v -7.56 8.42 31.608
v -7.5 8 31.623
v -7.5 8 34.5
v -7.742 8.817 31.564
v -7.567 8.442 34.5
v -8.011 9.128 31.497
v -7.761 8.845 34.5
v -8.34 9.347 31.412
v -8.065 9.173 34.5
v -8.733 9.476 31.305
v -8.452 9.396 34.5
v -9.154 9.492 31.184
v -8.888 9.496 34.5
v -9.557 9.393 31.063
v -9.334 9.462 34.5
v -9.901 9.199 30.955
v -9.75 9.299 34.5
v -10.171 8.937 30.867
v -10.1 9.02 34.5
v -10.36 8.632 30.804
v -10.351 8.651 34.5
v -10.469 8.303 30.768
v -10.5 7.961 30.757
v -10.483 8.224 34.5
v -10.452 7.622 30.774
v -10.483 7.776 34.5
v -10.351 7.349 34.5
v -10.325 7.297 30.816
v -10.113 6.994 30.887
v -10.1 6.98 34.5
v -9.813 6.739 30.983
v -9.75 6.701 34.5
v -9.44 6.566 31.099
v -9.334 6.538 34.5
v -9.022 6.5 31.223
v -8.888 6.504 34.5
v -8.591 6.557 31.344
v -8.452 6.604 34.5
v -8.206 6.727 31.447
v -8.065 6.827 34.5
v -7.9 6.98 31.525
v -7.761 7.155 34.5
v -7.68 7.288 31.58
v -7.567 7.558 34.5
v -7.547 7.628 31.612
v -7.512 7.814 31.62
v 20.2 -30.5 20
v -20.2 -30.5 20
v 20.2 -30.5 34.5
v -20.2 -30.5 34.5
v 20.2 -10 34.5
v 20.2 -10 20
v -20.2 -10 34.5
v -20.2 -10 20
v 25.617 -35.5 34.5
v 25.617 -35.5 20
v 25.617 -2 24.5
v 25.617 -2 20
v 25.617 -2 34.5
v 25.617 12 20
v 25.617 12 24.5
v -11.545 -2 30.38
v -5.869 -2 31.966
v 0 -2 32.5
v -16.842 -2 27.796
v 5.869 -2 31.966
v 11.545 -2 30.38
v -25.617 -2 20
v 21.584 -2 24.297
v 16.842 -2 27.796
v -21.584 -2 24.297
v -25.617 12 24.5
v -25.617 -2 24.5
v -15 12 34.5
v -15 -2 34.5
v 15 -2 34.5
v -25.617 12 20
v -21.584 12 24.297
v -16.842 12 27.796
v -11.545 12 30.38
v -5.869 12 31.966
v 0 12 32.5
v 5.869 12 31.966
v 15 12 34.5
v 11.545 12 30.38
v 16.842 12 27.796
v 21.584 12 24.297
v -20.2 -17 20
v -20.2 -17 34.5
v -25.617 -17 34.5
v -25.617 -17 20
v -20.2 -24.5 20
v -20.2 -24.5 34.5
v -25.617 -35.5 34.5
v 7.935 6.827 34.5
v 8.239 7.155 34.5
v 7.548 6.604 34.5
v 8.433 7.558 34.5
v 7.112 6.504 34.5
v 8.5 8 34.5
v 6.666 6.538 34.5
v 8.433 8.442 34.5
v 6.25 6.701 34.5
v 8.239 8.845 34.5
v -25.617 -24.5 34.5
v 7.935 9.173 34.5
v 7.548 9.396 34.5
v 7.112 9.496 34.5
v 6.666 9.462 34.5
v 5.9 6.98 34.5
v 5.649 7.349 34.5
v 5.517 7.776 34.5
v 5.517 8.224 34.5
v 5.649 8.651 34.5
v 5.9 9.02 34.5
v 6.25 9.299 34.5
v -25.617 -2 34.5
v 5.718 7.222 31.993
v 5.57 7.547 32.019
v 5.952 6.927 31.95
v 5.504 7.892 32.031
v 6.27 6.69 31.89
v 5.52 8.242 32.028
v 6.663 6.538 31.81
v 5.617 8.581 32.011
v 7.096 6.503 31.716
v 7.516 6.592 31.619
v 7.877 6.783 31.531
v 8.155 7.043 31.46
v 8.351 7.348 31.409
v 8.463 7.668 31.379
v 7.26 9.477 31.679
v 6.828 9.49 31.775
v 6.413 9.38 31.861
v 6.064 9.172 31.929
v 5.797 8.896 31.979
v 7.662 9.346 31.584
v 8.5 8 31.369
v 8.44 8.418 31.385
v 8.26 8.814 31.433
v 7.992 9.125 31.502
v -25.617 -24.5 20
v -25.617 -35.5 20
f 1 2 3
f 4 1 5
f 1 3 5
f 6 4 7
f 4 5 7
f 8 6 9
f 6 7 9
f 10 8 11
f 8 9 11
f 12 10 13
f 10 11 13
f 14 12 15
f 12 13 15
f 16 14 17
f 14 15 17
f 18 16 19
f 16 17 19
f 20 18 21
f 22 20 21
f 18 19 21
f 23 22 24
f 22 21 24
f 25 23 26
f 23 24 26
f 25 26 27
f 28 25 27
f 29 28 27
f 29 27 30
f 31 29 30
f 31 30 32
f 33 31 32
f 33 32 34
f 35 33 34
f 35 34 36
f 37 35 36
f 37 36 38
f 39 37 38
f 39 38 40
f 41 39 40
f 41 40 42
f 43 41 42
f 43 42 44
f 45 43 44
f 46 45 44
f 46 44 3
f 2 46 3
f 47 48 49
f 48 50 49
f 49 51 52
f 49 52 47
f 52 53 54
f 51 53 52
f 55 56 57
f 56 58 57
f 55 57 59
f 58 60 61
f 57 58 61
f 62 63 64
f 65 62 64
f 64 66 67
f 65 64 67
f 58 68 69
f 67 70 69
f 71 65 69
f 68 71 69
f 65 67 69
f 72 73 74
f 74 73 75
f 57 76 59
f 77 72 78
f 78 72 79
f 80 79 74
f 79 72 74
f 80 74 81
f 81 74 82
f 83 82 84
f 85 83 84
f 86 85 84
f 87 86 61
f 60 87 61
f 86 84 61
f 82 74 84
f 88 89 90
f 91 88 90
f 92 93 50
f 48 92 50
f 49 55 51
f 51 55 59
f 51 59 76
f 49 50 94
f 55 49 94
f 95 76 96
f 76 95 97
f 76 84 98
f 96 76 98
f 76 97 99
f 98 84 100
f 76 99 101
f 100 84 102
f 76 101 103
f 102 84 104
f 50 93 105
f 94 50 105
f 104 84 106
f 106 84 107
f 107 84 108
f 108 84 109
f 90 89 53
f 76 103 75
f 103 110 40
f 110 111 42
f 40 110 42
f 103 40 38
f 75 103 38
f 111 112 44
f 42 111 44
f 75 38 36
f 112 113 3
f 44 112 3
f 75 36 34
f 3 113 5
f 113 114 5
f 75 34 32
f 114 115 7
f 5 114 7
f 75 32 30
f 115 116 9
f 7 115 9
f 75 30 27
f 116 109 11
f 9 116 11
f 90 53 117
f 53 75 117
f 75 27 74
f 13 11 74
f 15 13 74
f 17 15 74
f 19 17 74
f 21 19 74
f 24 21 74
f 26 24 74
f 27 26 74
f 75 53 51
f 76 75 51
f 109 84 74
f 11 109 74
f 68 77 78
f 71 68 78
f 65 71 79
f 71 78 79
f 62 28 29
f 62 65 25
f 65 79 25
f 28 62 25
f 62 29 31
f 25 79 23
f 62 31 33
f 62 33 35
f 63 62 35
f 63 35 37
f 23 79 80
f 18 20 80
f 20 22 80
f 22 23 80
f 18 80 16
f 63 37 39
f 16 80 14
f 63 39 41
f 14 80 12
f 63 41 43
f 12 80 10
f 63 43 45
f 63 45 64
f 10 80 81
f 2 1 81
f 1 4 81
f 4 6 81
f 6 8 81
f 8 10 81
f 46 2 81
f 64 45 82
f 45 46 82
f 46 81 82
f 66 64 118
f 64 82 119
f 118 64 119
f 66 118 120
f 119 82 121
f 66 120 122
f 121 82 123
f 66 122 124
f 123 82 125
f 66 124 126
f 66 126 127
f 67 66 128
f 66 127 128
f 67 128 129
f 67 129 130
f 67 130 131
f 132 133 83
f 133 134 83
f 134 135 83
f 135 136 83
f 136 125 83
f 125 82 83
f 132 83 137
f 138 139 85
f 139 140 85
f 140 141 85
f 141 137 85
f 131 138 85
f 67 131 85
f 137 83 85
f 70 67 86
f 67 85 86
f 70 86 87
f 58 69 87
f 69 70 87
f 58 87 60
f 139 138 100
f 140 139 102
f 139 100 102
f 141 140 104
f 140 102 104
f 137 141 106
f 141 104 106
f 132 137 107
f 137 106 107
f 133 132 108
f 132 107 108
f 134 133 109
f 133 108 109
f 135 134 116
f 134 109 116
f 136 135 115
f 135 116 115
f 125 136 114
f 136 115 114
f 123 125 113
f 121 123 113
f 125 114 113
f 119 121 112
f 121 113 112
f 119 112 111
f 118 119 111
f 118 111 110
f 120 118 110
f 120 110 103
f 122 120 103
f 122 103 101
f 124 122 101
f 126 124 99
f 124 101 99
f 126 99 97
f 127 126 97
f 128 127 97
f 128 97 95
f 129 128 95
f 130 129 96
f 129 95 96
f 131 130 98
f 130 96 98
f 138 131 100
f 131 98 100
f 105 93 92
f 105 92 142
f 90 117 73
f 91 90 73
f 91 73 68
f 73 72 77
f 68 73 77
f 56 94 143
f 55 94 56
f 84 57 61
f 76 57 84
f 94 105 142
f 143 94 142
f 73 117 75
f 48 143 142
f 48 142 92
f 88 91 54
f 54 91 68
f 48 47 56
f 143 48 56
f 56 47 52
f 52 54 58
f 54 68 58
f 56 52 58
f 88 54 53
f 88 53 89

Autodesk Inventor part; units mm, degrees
ref_plane "YZ Plane" through (0, 0, 0) normal (1, 0, 0) x (0, 1, 0)
ref_plane "XZ Plane" through (0, 0, 0) normal (0, 1, 0) x (-1, 0, 0)
ref_plane "XY Plane" through (0, 0, 0) normal (0, 0, 1) x (1, 0, 0)
ref_plane "Plano de trabajo1" through (16, 0, 22.5) normal (0, 0, -1) x (-1, 0, 0)
sketch "Boceto2" plane through (16, 0, 22.5) normal (0, 0, -1) x (-1, 0, 0)
  line L0 (-6.5, 0) -> (0, 0) projected
  line L1 (0, 0) -> (32, 0) projected
  circle A0 centre (8, 8) radius 1.5
  circle A1 centre (24, 8) radius 1.5
  point P0 (16, 0)
  dimension "d15" = 3
  dimension "d16" = 3
extrude "Extrusión2" [suppressed]
ref_plane "Plano de trabajo2" through (0, 0, 0) normal (0, -1, 0) x (1, 0, 0)
sketch "Boceto4" plane through (0, 0, 0) normal (0, -1, 0) x (1, 0, 0)
  circle A0 centre (0, 0) radius 32.5
  arc A1 (28.2887, 16) -> (-28.2887, 16) centre (0, 0) ccw projected
  line L0 (0, 32.5) -> (0, 34.5)
  line L1 (0, 34.5) -> (-26.2329, 34.5)
  line L2 (-26.2329, 34.5) -> (30.7149, 34.5)
  line L3 (0, 0) -> (0, 20)
  arc A2 (28.2887, 16) -> (-28.2887, 16) centre (0, 0) ccw projected
  line L4 (0, 20) -> (50, 20)
  line L5 (50, 20) -> (-50, 20)
  line L6 (0, 34.5) -> (15, 34.5)
  line L7 (15, 34.5) -> (25.6174, 20)
  line L8 (0, 34.5) -> (-15, 34.5)
  line L9 (-15, 34.5) -> (-25.6174, 20)
  point P0 (-25.6174, 20)
  dimension "d19" = 2
  dimension "d20" = 20
  dimension "d21" = 50
  dimension "d22" = 100
  dimension "d23" = 15
  dimension "d24" = 15
extrude "Extrusión3" add sketch "Boceto4" against normal blind 12 contours A0 L0 L2 L7 | L9 L1 L0 A0
sketch "Boceto5" plane through (-15, 0, 34.5) normal (0, 0, 1) x (1, 0, 0)
  line L0 (30, 0) -> (30, 12) projected
  line L1 (30, 0) -> (30, 8)
  line L2 (30, 8) -> (22, 8)
  line L3 (22, 8) -> (6, 8)
  circle A0 centre (22, 8) radius 1.5
  circle A1 centre (6, 8) radius 1.5
  point P0 (15, 0)
  dimension "d27" = 8
  dimension "d28" = 8
  dimension "d29" = 16
  dimension "d30" = 3
  dimension "d31" = 3
extrude "Extrusión4" cut sketch "Boceto5" against normal blind 12
sketch "Boceto6" plane through (0, 0, 0) normal (0, -1, 0) x (1, 0, 0)
  circle A0 centre (0, 0) radius 32.5
  arc A1 (25.6174, 20) -> (-25.6174, 20) centre (0, 0) ccw projected
  line L0 (-15, 34.5) -> (15, 34.5) projected
  line L1 (25.6174, 20) -> (15, 34.5)
  line L2 (15, 34.5) -> (-15, 34.5)
  line L3 (-15, 34.5) -> (-25.6174, 20)
extrude "Extrusión5" add sketch "Boceto6" along normal blind 2 contours A0 L3 L0 L1
sketch "Boceto7" plane through (0, -2, 0) normal (0, -1, 0) x (1, 0, 0)
  line L0 (-25.6174, 20) -> (-15, 34.5) projected
  line L1 (-15, 34.5) -> (-25.6174, 34.5)
  line L2 (-25.6174, 34.5) -> (-25.6174, 20)
  line L3 (-25.6174, 20) -> (25.6174, 20)
  line L4 (25.6174, 20) -> (25.6174, 34.5)
  line L5 (25.6174, 20) -> (15, 34.5) projected
  line L6 (15, 34.5) -> (25.6174, 34.5)
  circle A0 centre (0, 0) radius 32.5
  line L7 (-15, 34.5) -> (15, 34.5)
extrude "Extrusión6" add sketch "Boceto7" along normal blind 8 contours L2 L1 L0 | A0 L3 | L0 L7 L5 A0 | L5 L6 L4 picked at (-1.7193, 25.9173)
sketch "Boceto8" plane through (-15, 12, 34.5) normal (0, 0, 1) x (1, 0, 0)
  line L0 (40.6174, -22) -> (-10.6174, -22) projected
  line L1 (-10.6174, -22) -> (-10.6174, -42.5)
  line L2 (-10.6174, -42.5) -> (39.7361, -42.5)
  line L3 (40.6174, -22) -> (40.6174, -42.5)
  line L4 (40.6174, -42.5) -> (39.7361, -42.5)
  line L5 (-10.6174, -22) -> (40.6174, -22) projected
  line L6 (40.6174, -14) -> (40.6174, -22) projected
  line L7 (-10.6174, -22) -> (40.6174, -22)
  line L8 (15, -22) -> (35.2, -22)
  line L9 (35.2, -22) -> (35.2, -42.5)
  line L10 (15, -22) -> (-5.2, -22)
  line L11 (-5.2, -22) -> (-5.2, -42.5)
  line L12 (-5.2, -42.5) -> (-5.2, -37.5)
  line L13 (-5.2, -22) -> (-5.2, -29)
  line L14 (-5.2, -29) -> (-10.6174, -29)
  line L15 (-5.2, -42.5) -> (-5.2, -36.5)
  line L16 (-5.2, -36.5) -> (-10.6174, -36.5)
  point P0 (15, -12)
  dimension "d38" = 20.5
  dimension "d39" = 20.5
  dimension "d40" = 20.2
  dimension "d41" = 20.2
  dimension "d43" = 7
  dimension "d44" = 6
extrude "Extrusión7" add sketch "Boceto8" against normal blind 14.5 contours L3 L4 L2 L9 L0 | L11 L14 L1 L0 | L2 L1 L16 L11
sketch "Boceto9" plane through (20.2, -30.5, 34.5) normal (0, -1, 0) x (1, 0, 0)
  line L0 (5.4174, -14.5) -> (5.4174, 0) projected
  line L1 (-45.8174, 0) -> (-45.8174, -14.5) projected
  line L2 (5.4174, 0) -> (-45.8174, 0)
  line L3 (-45.8174, 0) -> (-45.8174, -14.5)
  line L4 (-45.8174, -14.5) -> (5.4174, -14.5)
  line L5 (5.4174, 0) -> (-5.2, 0) projected
  line L6 (5.4174, -14.5) -> (5.4174, 0)
  point P0 (-20.2, -34.5)
extrude "Extrusión8" add sketch "Boceto9" along normal blind 5
sketch "Boceto10" plane through (0, -2, 0) normal (0, 1, 0) x (1, 0, 0)
  line L0 (-15, -34.5) -> (-25.6174, -34.5) projected
  line L1 (-15, -34.5) -> (-25.6174, -34.5)
  line L2 (-25.6174, -34.5) -> (-25.6174, -24.5)
  line L3 (-25.6174, -34.5) -> (-25.6174, -20) projected
  line L4 (-25.6174, -24.5) -> (-15, -34.5)
  line L5 (-25.6174, -20) -> (25.6174, -20) projected
  line L6 (-25.6174, -24.5) -> (-25.6174, -20)
  line L7 (-25.6174, -20) -> (-15, -34.5)
  line L8 (-15, -34.5) -> (-25.6174, -20) projected
  arc A0 (-25.6174, -20) -> (25.6174, -20) centre (0, 0) ccw projected
  line L9 (0, -32.5) -> (0, -25.3096)
  line L10 (15, -34.5) -> (25.6174, -34.5)
  line L11 (25.6174, -34.5) -> (25.6174, -24.5)
  line L12 (25.6174, -34.5) -> (25.6174, -20)
  line L13 (25.6174, -24.5) -> (15, -34.5)
  line L14 (25.6174, -20) -> (15, -34.5)
  dimension "d49" = 10
extrude "Extrusión9" add sketch "Boceto10" along normal blind 14 contours L12 L13 L14 | L4 L3 L7
sketch "Boceto11" plane through (-25.6174, -17, 34.5) normal (0, 0, 1) x (1, 0, 0)
  line L0 (45.8174, 7) -> (45.8174, -13.5) projected
  line L1 (45.8174, -13.5) -> (45.8174, 7)
  line L2 (45.8174, 7) -> (45.8174, -3.25)
  point P0 (25.6174, 17)
properties part number "brazo_articulado_2"
